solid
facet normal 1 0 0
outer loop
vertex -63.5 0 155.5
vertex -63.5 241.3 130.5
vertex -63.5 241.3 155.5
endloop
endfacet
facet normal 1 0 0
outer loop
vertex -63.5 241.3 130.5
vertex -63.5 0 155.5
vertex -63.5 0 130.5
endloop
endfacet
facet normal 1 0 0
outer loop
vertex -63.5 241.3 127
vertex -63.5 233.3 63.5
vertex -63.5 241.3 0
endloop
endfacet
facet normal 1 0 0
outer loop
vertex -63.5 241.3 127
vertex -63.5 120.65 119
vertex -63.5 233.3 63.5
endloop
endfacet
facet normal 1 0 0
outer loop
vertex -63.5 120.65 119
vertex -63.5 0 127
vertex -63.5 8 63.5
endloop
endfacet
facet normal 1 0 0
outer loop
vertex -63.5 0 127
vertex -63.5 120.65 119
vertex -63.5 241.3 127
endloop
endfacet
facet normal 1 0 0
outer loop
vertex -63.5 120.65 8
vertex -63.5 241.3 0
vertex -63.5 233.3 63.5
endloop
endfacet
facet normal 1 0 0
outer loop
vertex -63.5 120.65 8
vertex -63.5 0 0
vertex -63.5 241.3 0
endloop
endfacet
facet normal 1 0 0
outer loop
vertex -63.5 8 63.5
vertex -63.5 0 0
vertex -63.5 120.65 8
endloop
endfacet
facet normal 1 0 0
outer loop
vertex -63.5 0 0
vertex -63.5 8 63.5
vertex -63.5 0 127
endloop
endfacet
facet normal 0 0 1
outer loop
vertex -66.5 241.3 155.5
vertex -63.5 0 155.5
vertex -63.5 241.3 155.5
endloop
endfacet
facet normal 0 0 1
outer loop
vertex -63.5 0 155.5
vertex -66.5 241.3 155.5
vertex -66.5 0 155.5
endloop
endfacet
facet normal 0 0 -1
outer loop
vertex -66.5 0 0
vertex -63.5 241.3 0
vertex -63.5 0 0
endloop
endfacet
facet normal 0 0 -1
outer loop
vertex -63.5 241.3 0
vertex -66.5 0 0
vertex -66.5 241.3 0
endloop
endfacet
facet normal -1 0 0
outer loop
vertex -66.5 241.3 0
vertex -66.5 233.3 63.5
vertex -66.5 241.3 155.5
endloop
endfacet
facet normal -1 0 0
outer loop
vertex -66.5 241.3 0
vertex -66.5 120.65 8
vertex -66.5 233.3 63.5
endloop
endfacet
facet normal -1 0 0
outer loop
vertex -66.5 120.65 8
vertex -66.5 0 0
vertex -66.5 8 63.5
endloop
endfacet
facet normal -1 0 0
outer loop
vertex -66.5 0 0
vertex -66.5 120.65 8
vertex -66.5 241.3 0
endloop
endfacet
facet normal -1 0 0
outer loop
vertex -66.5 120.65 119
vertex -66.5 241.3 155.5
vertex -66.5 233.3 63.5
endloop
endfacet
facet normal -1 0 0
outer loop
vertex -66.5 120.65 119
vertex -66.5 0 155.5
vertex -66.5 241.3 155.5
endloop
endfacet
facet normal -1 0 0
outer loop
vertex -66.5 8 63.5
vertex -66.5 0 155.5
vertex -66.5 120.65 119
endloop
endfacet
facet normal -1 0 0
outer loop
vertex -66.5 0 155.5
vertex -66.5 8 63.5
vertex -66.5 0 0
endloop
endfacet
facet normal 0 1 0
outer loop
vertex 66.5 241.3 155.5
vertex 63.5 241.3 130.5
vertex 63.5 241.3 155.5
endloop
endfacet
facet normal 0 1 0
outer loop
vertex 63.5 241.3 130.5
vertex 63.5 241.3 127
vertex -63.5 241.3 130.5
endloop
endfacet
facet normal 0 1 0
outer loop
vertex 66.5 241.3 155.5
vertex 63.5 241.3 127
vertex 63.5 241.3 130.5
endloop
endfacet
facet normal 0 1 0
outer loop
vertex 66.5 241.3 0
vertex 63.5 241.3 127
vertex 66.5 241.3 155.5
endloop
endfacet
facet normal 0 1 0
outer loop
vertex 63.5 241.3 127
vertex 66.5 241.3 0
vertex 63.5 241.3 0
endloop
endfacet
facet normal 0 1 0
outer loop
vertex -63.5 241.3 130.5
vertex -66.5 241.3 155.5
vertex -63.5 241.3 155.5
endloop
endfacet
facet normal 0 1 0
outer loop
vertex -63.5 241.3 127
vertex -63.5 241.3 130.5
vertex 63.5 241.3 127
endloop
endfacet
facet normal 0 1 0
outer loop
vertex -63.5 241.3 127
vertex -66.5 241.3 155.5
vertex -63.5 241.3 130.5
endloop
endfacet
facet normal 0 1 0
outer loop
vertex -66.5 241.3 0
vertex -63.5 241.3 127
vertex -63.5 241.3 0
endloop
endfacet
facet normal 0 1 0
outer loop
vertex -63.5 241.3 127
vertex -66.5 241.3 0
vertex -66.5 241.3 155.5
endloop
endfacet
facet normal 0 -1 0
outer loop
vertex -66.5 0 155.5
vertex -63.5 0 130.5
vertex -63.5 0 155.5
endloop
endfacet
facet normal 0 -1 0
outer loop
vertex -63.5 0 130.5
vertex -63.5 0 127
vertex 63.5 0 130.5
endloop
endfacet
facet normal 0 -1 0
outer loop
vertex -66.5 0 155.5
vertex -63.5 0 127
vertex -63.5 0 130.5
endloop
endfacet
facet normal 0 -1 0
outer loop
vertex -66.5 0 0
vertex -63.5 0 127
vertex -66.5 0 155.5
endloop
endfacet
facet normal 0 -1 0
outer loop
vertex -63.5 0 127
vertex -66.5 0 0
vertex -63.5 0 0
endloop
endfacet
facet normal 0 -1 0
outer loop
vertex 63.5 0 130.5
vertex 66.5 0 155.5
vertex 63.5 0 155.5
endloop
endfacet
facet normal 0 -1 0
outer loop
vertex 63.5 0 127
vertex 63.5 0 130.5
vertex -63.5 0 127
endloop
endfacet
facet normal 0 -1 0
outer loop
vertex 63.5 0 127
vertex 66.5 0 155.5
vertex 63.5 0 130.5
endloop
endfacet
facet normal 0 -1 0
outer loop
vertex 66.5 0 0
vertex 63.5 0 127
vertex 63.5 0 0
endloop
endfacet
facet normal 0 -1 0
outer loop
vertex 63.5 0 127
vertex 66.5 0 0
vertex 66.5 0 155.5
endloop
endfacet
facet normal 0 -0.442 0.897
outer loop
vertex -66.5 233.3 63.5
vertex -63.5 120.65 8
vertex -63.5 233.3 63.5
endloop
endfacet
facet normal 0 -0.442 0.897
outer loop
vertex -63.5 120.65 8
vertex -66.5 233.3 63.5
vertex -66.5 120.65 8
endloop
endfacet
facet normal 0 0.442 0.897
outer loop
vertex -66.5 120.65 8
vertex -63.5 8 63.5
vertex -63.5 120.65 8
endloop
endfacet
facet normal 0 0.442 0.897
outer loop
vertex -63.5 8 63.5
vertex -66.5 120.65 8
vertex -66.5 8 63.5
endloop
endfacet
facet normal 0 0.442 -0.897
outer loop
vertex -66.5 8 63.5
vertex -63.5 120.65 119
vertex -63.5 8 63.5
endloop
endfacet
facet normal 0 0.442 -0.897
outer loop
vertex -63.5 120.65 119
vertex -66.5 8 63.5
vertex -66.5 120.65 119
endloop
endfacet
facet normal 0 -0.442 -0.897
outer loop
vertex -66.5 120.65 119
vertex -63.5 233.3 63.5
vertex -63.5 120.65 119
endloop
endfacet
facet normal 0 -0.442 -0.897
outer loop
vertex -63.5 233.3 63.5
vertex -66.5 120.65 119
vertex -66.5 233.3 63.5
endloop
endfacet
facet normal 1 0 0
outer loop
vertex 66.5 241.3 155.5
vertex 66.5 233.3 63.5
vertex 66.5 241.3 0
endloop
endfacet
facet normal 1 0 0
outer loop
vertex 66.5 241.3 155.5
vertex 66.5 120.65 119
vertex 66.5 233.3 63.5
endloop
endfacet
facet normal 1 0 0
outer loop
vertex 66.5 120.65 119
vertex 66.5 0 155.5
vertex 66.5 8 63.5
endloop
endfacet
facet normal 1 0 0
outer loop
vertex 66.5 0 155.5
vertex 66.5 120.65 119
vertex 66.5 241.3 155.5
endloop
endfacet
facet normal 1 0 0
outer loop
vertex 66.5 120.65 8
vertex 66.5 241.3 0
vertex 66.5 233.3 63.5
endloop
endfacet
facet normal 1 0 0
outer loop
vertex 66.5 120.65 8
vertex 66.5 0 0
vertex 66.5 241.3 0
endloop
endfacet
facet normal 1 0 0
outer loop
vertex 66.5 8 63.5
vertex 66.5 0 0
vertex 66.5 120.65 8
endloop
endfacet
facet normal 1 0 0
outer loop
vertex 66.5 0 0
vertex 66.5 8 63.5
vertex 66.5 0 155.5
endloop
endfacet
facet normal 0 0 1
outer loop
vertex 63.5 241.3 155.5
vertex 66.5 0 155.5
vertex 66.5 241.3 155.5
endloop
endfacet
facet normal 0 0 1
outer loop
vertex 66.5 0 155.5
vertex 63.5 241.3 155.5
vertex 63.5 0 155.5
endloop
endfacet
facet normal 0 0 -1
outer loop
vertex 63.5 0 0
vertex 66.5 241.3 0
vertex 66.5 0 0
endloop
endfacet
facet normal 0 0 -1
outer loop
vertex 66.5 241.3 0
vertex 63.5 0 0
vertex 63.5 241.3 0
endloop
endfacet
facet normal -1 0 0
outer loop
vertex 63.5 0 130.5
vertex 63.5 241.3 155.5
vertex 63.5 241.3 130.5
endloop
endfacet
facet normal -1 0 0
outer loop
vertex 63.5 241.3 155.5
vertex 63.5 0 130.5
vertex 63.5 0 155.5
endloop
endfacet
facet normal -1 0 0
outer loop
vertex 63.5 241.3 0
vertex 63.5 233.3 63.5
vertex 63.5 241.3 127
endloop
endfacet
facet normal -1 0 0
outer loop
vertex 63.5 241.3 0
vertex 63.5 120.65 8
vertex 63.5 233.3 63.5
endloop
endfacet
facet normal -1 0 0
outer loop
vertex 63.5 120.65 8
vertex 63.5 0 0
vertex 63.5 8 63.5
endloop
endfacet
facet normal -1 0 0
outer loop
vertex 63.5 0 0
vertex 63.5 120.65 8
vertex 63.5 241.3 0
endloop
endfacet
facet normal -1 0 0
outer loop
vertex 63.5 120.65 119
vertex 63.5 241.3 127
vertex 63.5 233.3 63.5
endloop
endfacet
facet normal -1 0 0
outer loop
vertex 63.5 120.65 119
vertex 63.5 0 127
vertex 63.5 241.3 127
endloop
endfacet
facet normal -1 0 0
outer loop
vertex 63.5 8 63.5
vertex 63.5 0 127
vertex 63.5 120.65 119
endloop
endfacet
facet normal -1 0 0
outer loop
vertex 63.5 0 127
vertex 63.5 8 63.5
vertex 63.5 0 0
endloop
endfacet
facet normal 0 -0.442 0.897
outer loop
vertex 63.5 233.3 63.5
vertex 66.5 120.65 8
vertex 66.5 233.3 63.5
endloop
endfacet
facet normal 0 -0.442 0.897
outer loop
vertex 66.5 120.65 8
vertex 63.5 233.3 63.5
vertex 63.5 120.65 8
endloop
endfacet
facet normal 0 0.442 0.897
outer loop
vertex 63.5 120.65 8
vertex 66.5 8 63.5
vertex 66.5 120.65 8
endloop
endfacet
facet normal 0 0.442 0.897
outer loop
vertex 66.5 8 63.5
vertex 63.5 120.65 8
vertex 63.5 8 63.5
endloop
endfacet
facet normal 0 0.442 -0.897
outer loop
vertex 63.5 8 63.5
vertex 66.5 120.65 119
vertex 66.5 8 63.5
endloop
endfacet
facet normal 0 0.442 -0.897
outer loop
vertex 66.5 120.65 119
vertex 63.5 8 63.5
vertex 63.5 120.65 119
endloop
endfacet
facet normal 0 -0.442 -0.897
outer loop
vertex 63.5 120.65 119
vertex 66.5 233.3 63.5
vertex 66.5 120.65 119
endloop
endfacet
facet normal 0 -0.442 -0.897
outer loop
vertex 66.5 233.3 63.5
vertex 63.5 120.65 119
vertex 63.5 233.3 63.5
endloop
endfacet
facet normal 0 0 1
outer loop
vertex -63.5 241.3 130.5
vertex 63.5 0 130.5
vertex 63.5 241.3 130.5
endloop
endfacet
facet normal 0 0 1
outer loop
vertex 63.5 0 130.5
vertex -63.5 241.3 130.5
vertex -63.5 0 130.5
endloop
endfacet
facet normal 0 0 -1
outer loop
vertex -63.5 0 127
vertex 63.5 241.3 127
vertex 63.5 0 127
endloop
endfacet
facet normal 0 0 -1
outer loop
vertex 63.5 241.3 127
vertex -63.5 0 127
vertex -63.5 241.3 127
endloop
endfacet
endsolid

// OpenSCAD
/* =====================================================
   Bagel shelf (cabinet riser)
   =====================================================
   An H-shaped riser that stacks two bags of bagels in a
   kitchen cabinet. One bag lies on the cabinet floor between
   the legs and the other lies on the shelf. The legs carry on
   above the shelf as low side rails, so the top bag can't roll
   off sideways.

   Measured:
     bagel bag     9 long x 4.5 wide x 4.5 tall (in)
     cabinet       11 deep x 10 5/8 tall (in)

   Bags lie lengthwise front to back. With the default
   clearances the shelf top sits 5.1 in up and the top bag
   tops out around 9.6 in, which leaves about 1 in under the
   cabinet ceiling.

   Diamond windows in the legs save filament, and their 45°
   edges print without supports.

   Print it standing on its front face (depth along Z, the H
   lying flat on the bed). Every wall is vertical in that
   orientation, so it needs no supports. It's 241 mm tall, so
   it fits a 256 mm bed.

   Coordinates: X across (centred), Y front to back (front at
   Y = 0), Z up from the cabinet floor.
   ===================================================== */

in = 25.4;   // mm per inch

/* ── Bag & cabinet (measured, inches) ───────────────── */
bag_l_in   = 9;
bag_w_in   = 4.5;
bag_h_in   = 4.5;
cab_d_in   = 11;
cab_h_in   = 10 + 5/8;

/* ── Clearances (inches) ────────────────────────────── */
side_gap_in = 0.5;   // total, across the bag's width
top_gap_in  = 0.5;   // over the lower bag, under the shelf
depth_add_in = 0.5;  // shelf depth beyond the bag length

/* ── Plastic (mm) ───────────────────────────────────── */
wall    = 3;     // leg thickness
deck    = 3.5;   // shelf thickness
rail_h  = 25;    // leg height above the shelf top
window  = true;  // diamond windows in the legs
win_web = 8;     // solid web around and between windows

/* ── Derived (mm) ───────────────────────────────────── */
inner_w = (bag_w_in + side_gap_in) * in;          // between legs
depth   = (bag_l_in + depth_add_in) * in;
under_h = (bag_h_in + top_gap_in) * in;           // floor to shelf underside
outer_w = inner_w + 2 * wall;
total_h = under_h + deck + rail_h;

assert(depth <= cab_d_in * in, "shelf is deeper than the cabinet");
assert(under_h + deck + bag_h_in * in <= cab_h_in * in,
       "top bag won't fit under the cabinet ceiling");

eps = 0.01;

module leg() {
    difference() {
        cube([wall, depth, total_h]);
        if (window) {
            // a row of diamonds in the part below the shelf
            dh = under_h - 2 * win_web;           // diamond height
            n  = max(1, floor((depth - win_web) / (dh + win_web)));
            pitch = (depth - win_web) / n;
            // diamond length along Y. Y is up when printing, so this
            // stays >= dh to keep the edges at 45° or steeper
            dw = pitch - win_web;
            for (i = [0 : n - 1])
                translate([-eps, win_web + pitch * (i + 0.5) - win_web / 2,
                           win_web + dh / 2])
                    rotate([90, 0, 90])
                        linear_extrude(wall + 2 * eps)
                            polygon([[0, -dh / 2], [dw / 2, 0],
                                     [0, dh / 2], [-dw / 2, 0]]);
        }
    }
}

module bagel_shelf() {
    for (s = [-1, 1])
        translate([s < 0 ? -outer_w / 2 : inner_w / 2, 0, 0]) leg();
    translate([-inner_w / 2 - eps, 0, under_h])
        cube([inner_w + 2 * eps, depth, deck]);
}

// the two bags, for checking the fit in preview only
module bags_mock() {
    bw = bag_w_in * in; bl = bag_l_in * in; bh = bag_h_in * in;
    color("tan", 0.5) {
        translate([-bw / 2, (depth - bl) / 2, 0]) cube([bw, bl, bh]);
        translate([-bw / 2, (depth - bl) / 2, under_h + deck]) cube([bw, bl, bh]);
    }
}

bagel_shelf();
%bags_mock();
